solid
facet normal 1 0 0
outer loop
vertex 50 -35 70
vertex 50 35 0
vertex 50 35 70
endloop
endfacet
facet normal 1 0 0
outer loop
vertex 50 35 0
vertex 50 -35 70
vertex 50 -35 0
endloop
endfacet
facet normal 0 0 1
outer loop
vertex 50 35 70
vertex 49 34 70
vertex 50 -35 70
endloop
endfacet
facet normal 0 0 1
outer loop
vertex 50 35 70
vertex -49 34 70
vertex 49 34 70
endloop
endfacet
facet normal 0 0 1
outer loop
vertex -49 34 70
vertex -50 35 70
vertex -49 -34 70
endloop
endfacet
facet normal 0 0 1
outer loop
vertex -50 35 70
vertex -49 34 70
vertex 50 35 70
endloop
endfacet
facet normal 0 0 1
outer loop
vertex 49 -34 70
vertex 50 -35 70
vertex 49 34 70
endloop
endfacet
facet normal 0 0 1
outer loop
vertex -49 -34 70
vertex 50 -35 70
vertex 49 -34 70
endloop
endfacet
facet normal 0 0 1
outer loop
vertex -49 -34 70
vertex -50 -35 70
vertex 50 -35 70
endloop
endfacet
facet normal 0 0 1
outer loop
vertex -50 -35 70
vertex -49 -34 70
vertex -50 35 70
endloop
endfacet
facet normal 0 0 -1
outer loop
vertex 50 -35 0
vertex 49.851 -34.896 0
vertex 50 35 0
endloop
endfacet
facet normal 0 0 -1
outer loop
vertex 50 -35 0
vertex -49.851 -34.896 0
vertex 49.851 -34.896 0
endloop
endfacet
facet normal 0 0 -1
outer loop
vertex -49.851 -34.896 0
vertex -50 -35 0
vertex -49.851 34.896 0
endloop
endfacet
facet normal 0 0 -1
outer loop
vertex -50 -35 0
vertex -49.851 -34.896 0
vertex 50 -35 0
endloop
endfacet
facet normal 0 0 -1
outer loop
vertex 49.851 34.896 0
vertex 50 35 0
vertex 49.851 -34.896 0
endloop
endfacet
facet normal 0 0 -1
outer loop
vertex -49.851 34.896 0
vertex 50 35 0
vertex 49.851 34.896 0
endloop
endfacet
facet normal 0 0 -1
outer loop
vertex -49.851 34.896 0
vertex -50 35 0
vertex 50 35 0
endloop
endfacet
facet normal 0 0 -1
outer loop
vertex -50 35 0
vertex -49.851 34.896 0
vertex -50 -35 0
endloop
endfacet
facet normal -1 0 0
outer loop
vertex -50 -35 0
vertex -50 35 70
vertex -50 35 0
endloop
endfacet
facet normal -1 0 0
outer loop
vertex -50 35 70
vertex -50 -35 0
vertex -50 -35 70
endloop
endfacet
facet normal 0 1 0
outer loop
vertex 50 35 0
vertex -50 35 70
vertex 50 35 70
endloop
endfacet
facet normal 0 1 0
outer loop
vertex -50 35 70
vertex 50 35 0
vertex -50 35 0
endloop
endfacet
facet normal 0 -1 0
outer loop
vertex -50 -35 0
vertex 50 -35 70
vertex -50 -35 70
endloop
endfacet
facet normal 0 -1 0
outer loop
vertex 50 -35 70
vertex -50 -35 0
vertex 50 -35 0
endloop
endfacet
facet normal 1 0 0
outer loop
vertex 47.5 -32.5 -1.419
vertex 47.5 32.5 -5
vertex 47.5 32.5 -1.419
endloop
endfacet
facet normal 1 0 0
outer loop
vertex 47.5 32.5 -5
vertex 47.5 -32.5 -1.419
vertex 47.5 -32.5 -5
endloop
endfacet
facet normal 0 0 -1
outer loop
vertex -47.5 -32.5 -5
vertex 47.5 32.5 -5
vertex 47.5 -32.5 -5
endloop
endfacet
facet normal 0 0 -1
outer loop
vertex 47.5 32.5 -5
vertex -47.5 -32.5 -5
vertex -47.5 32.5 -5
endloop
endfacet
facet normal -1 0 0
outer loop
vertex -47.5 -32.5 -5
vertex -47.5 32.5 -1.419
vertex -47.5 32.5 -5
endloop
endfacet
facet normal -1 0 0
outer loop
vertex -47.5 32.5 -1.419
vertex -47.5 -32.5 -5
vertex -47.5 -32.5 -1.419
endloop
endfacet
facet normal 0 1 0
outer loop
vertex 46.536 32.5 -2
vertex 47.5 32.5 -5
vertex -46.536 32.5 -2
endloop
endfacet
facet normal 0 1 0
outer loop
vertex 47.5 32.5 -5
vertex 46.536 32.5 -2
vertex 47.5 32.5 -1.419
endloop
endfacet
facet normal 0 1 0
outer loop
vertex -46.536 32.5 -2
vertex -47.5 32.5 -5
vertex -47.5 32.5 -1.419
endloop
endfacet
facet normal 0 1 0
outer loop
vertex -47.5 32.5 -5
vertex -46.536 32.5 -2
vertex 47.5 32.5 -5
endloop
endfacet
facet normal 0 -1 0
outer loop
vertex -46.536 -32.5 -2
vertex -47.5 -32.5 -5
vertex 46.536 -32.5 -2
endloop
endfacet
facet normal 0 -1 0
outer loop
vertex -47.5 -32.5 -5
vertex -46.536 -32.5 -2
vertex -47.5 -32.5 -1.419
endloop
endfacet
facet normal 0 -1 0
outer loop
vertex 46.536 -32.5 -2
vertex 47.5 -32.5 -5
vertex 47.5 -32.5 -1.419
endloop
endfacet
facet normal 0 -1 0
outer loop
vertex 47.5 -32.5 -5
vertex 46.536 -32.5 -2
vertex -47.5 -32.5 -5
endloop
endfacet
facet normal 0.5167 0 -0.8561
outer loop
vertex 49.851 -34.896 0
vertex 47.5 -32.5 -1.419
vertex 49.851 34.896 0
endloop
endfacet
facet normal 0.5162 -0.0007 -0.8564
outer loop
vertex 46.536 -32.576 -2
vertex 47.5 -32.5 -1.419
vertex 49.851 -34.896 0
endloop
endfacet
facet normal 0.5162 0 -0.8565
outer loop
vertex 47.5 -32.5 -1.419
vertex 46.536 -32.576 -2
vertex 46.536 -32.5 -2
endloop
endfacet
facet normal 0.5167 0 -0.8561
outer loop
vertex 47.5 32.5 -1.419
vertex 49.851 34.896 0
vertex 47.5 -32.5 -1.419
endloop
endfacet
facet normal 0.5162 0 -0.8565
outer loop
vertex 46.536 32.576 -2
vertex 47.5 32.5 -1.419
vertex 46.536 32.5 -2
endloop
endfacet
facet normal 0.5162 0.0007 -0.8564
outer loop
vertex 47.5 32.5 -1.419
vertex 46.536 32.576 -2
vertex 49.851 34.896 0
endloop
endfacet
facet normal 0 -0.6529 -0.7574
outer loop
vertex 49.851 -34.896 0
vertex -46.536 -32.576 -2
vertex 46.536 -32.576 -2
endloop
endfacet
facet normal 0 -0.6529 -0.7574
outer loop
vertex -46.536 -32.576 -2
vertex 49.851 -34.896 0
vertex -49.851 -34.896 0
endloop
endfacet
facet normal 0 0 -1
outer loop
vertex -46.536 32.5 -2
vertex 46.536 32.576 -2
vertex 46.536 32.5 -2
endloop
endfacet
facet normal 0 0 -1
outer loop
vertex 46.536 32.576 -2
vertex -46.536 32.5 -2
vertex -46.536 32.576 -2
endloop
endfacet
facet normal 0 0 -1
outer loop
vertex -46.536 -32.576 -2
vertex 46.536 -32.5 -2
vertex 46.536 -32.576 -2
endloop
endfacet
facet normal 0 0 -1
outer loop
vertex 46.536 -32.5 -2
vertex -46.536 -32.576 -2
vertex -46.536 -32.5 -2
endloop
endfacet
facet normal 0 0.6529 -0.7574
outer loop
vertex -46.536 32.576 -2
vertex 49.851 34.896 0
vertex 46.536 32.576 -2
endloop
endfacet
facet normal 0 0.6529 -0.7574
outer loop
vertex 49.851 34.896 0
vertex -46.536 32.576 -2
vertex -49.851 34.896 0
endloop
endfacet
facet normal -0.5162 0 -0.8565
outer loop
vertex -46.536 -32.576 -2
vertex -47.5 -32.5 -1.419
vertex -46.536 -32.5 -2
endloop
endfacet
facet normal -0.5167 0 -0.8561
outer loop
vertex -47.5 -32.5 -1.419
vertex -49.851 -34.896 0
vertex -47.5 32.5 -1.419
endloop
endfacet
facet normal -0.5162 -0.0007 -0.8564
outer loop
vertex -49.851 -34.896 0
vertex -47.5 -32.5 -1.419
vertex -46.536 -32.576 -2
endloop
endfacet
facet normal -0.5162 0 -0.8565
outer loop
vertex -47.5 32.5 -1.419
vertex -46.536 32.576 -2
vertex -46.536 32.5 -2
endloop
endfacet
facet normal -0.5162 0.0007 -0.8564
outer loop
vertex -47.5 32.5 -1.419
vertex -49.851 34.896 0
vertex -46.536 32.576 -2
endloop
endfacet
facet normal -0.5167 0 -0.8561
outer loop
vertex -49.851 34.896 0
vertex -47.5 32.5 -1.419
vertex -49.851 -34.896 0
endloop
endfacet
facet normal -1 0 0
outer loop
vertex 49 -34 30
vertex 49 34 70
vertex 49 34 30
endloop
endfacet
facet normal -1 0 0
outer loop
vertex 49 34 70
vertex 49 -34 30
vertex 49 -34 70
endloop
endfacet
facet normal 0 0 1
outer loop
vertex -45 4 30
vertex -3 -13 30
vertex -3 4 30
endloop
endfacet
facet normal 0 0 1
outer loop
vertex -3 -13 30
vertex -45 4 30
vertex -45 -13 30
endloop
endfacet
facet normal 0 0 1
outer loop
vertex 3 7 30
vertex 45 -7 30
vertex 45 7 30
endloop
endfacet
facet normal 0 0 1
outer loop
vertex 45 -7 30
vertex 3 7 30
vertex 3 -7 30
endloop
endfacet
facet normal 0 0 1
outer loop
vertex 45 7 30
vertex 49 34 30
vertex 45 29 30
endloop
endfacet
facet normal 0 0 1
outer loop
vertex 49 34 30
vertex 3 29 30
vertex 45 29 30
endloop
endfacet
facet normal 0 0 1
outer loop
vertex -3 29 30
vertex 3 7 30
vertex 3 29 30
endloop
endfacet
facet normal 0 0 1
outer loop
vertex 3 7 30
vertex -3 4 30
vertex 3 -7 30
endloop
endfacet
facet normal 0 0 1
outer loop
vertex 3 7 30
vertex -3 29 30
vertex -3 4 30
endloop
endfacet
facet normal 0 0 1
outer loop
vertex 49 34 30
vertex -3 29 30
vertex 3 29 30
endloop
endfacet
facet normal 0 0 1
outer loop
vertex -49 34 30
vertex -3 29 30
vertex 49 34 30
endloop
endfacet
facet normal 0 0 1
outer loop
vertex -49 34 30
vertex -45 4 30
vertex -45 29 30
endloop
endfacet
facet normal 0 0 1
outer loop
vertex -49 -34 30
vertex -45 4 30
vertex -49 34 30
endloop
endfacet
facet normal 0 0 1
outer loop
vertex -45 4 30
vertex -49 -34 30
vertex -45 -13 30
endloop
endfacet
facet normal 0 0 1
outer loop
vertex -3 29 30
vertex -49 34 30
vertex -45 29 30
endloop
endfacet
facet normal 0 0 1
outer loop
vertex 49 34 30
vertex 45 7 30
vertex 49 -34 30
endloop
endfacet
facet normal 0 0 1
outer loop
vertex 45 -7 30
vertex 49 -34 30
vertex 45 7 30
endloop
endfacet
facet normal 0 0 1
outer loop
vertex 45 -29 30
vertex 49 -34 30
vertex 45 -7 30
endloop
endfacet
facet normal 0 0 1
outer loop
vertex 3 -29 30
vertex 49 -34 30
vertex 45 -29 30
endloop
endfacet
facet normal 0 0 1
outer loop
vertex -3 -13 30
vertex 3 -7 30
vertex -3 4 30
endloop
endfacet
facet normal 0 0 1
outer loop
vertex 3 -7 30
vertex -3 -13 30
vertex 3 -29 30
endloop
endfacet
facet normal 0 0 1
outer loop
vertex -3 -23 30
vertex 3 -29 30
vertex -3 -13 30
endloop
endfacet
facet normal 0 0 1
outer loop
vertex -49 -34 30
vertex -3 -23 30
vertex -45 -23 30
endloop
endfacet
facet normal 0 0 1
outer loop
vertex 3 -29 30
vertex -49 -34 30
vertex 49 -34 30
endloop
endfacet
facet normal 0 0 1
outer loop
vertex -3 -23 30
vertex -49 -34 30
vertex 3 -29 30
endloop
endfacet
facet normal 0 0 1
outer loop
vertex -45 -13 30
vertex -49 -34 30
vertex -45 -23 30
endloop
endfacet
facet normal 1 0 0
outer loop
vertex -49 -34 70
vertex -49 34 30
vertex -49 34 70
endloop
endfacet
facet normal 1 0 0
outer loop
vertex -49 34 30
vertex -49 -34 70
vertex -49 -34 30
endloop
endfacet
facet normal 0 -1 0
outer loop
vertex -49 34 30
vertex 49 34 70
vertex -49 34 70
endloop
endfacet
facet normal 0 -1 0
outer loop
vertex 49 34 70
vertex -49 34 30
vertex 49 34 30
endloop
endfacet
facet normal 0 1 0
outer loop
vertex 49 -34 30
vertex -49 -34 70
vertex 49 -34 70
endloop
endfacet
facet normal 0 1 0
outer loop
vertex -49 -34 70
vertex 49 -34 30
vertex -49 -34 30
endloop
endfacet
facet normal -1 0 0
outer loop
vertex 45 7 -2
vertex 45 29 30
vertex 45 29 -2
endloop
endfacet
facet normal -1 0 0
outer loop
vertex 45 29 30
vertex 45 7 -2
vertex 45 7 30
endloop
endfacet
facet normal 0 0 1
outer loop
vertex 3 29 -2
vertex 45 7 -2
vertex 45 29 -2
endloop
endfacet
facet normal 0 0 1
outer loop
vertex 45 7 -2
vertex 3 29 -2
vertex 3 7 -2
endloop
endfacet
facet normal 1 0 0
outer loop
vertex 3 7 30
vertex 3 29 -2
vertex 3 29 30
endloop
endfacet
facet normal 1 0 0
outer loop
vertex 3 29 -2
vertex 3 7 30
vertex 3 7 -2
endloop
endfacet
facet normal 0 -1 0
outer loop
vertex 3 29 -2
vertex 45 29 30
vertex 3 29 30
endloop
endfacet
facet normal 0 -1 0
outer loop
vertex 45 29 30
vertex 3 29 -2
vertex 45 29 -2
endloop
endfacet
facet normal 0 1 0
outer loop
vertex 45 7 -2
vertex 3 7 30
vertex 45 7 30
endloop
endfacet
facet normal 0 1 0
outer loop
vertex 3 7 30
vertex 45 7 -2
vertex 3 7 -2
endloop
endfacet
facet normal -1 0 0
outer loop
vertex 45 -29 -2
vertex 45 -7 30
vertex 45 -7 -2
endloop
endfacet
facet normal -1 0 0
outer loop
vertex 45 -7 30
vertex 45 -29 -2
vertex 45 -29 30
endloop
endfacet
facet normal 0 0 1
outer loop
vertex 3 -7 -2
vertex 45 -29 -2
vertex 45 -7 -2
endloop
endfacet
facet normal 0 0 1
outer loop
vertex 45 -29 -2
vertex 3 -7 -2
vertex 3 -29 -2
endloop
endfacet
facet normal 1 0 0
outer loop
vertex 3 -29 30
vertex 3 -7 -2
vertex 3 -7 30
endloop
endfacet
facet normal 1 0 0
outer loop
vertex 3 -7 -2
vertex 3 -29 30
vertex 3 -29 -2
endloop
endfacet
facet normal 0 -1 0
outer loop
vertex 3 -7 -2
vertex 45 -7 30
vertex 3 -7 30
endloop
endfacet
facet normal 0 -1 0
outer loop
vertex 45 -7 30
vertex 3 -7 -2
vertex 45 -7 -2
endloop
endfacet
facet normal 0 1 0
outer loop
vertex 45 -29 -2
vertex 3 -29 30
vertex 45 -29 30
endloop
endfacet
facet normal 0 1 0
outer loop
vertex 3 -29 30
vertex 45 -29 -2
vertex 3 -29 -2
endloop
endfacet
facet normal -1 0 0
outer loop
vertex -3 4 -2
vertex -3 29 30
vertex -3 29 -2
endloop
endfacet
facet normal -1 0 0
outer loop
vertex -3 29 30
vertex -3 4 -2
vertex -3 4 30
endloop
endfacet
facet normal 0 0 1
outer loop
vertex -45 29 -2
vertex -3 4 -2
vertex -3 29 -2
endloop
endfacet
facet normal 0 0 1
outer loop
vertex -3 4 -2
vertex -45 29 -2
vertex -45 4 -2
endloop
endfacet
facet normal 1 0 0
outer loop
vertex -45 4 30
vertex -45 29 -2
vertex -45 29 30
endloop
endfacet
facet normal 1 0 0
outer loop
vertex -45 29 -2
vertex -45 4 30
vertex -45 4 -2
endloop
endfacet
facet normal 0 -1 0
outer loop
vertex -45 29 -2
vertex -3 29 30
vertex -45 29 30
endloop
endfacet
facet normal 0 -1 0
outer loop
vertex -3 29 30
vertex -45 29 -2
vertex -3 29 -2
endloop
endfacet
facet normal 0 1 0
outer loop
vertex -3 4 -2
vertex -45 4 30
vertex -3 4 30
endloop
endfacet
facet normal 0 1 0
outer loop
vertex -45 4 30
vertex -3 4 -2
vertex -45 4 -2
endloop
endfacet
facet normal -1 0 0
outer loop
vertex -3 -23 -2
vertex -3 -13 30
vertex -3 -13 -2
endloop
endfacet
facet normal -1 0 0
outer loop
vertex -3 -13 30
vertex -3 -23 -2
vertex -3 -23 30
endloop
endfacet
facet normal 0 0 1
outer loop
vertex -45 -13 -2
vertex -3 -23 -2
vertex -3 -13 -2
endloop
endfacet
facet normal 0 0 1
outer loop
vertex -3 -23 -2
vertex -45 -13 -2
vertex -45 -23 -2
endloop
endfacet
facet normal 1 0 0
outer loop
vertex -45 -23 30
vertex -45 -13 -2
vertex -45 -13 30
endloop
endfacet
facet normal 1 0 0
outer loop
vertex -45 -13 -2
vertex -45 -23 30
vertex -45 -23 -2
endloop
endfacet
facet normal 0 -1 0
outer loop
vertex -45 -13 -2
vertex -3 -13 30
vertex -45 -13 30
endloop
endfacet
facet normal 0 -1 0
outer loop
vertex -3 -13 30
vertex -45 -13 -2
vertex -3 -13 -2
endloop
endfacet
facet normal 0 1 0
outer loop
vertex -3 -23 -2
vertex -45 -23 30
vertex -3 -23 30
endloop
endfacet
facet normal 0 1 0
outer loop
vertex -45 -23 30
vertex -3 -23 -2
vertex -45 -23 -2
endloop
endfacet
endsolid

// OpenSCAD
H=70;               // Height of main box
H2=5;               // Height of bottom centering
SIDE1=100;          // Side of box
SIDE2=70;           // Side of box
D=2;                // Wall-thickness of box
D2=2.5;             // Setback of centering
HI=40;              // Inner Cut-Out

difference() {
    union() {
        translate([0,0,H/2]) cube([SIDE1,SIDE2,H], center=true );                                     // Main Box 100x100x40
        translate([0,0,-H2/2]) cube([SIDE1-2*D2,SIDE2-2*D2,H2],center=true);                          // Bottom
        scale([1,0.7,1]) translate([0,0,-2]) rotate([0,0,45]) cylinder(h=2,d1=1.95*(SIDE2-D2),d2=1.41*SIDE1,$fn=4);    // Chamfer
    }
    translate([0,0, 2*H-HI]) cube([SIDE1-D,SIDE2-D,2*H],center=true);                                  // Inner Cut-Out
    
    translate([ 24, 18, 30]) cube([42,22,64], center=true); // Rect-Tokens: Mind
    translate([ 24,-18, 30]) cube([42,22,64], center=true); // Rect-Tokens: Health

    translate([-24, 16.5, 30]) cube([42,25,64], center=true); // Rect-Tokens: Elixiers & States
    translate([-24,-18, 30]) cube([42,10,64], center=true); // Rect-Tokens: Madness

//    translate([0,-90,0]) cube([300,200,300],center=true); // Tester
   
}
